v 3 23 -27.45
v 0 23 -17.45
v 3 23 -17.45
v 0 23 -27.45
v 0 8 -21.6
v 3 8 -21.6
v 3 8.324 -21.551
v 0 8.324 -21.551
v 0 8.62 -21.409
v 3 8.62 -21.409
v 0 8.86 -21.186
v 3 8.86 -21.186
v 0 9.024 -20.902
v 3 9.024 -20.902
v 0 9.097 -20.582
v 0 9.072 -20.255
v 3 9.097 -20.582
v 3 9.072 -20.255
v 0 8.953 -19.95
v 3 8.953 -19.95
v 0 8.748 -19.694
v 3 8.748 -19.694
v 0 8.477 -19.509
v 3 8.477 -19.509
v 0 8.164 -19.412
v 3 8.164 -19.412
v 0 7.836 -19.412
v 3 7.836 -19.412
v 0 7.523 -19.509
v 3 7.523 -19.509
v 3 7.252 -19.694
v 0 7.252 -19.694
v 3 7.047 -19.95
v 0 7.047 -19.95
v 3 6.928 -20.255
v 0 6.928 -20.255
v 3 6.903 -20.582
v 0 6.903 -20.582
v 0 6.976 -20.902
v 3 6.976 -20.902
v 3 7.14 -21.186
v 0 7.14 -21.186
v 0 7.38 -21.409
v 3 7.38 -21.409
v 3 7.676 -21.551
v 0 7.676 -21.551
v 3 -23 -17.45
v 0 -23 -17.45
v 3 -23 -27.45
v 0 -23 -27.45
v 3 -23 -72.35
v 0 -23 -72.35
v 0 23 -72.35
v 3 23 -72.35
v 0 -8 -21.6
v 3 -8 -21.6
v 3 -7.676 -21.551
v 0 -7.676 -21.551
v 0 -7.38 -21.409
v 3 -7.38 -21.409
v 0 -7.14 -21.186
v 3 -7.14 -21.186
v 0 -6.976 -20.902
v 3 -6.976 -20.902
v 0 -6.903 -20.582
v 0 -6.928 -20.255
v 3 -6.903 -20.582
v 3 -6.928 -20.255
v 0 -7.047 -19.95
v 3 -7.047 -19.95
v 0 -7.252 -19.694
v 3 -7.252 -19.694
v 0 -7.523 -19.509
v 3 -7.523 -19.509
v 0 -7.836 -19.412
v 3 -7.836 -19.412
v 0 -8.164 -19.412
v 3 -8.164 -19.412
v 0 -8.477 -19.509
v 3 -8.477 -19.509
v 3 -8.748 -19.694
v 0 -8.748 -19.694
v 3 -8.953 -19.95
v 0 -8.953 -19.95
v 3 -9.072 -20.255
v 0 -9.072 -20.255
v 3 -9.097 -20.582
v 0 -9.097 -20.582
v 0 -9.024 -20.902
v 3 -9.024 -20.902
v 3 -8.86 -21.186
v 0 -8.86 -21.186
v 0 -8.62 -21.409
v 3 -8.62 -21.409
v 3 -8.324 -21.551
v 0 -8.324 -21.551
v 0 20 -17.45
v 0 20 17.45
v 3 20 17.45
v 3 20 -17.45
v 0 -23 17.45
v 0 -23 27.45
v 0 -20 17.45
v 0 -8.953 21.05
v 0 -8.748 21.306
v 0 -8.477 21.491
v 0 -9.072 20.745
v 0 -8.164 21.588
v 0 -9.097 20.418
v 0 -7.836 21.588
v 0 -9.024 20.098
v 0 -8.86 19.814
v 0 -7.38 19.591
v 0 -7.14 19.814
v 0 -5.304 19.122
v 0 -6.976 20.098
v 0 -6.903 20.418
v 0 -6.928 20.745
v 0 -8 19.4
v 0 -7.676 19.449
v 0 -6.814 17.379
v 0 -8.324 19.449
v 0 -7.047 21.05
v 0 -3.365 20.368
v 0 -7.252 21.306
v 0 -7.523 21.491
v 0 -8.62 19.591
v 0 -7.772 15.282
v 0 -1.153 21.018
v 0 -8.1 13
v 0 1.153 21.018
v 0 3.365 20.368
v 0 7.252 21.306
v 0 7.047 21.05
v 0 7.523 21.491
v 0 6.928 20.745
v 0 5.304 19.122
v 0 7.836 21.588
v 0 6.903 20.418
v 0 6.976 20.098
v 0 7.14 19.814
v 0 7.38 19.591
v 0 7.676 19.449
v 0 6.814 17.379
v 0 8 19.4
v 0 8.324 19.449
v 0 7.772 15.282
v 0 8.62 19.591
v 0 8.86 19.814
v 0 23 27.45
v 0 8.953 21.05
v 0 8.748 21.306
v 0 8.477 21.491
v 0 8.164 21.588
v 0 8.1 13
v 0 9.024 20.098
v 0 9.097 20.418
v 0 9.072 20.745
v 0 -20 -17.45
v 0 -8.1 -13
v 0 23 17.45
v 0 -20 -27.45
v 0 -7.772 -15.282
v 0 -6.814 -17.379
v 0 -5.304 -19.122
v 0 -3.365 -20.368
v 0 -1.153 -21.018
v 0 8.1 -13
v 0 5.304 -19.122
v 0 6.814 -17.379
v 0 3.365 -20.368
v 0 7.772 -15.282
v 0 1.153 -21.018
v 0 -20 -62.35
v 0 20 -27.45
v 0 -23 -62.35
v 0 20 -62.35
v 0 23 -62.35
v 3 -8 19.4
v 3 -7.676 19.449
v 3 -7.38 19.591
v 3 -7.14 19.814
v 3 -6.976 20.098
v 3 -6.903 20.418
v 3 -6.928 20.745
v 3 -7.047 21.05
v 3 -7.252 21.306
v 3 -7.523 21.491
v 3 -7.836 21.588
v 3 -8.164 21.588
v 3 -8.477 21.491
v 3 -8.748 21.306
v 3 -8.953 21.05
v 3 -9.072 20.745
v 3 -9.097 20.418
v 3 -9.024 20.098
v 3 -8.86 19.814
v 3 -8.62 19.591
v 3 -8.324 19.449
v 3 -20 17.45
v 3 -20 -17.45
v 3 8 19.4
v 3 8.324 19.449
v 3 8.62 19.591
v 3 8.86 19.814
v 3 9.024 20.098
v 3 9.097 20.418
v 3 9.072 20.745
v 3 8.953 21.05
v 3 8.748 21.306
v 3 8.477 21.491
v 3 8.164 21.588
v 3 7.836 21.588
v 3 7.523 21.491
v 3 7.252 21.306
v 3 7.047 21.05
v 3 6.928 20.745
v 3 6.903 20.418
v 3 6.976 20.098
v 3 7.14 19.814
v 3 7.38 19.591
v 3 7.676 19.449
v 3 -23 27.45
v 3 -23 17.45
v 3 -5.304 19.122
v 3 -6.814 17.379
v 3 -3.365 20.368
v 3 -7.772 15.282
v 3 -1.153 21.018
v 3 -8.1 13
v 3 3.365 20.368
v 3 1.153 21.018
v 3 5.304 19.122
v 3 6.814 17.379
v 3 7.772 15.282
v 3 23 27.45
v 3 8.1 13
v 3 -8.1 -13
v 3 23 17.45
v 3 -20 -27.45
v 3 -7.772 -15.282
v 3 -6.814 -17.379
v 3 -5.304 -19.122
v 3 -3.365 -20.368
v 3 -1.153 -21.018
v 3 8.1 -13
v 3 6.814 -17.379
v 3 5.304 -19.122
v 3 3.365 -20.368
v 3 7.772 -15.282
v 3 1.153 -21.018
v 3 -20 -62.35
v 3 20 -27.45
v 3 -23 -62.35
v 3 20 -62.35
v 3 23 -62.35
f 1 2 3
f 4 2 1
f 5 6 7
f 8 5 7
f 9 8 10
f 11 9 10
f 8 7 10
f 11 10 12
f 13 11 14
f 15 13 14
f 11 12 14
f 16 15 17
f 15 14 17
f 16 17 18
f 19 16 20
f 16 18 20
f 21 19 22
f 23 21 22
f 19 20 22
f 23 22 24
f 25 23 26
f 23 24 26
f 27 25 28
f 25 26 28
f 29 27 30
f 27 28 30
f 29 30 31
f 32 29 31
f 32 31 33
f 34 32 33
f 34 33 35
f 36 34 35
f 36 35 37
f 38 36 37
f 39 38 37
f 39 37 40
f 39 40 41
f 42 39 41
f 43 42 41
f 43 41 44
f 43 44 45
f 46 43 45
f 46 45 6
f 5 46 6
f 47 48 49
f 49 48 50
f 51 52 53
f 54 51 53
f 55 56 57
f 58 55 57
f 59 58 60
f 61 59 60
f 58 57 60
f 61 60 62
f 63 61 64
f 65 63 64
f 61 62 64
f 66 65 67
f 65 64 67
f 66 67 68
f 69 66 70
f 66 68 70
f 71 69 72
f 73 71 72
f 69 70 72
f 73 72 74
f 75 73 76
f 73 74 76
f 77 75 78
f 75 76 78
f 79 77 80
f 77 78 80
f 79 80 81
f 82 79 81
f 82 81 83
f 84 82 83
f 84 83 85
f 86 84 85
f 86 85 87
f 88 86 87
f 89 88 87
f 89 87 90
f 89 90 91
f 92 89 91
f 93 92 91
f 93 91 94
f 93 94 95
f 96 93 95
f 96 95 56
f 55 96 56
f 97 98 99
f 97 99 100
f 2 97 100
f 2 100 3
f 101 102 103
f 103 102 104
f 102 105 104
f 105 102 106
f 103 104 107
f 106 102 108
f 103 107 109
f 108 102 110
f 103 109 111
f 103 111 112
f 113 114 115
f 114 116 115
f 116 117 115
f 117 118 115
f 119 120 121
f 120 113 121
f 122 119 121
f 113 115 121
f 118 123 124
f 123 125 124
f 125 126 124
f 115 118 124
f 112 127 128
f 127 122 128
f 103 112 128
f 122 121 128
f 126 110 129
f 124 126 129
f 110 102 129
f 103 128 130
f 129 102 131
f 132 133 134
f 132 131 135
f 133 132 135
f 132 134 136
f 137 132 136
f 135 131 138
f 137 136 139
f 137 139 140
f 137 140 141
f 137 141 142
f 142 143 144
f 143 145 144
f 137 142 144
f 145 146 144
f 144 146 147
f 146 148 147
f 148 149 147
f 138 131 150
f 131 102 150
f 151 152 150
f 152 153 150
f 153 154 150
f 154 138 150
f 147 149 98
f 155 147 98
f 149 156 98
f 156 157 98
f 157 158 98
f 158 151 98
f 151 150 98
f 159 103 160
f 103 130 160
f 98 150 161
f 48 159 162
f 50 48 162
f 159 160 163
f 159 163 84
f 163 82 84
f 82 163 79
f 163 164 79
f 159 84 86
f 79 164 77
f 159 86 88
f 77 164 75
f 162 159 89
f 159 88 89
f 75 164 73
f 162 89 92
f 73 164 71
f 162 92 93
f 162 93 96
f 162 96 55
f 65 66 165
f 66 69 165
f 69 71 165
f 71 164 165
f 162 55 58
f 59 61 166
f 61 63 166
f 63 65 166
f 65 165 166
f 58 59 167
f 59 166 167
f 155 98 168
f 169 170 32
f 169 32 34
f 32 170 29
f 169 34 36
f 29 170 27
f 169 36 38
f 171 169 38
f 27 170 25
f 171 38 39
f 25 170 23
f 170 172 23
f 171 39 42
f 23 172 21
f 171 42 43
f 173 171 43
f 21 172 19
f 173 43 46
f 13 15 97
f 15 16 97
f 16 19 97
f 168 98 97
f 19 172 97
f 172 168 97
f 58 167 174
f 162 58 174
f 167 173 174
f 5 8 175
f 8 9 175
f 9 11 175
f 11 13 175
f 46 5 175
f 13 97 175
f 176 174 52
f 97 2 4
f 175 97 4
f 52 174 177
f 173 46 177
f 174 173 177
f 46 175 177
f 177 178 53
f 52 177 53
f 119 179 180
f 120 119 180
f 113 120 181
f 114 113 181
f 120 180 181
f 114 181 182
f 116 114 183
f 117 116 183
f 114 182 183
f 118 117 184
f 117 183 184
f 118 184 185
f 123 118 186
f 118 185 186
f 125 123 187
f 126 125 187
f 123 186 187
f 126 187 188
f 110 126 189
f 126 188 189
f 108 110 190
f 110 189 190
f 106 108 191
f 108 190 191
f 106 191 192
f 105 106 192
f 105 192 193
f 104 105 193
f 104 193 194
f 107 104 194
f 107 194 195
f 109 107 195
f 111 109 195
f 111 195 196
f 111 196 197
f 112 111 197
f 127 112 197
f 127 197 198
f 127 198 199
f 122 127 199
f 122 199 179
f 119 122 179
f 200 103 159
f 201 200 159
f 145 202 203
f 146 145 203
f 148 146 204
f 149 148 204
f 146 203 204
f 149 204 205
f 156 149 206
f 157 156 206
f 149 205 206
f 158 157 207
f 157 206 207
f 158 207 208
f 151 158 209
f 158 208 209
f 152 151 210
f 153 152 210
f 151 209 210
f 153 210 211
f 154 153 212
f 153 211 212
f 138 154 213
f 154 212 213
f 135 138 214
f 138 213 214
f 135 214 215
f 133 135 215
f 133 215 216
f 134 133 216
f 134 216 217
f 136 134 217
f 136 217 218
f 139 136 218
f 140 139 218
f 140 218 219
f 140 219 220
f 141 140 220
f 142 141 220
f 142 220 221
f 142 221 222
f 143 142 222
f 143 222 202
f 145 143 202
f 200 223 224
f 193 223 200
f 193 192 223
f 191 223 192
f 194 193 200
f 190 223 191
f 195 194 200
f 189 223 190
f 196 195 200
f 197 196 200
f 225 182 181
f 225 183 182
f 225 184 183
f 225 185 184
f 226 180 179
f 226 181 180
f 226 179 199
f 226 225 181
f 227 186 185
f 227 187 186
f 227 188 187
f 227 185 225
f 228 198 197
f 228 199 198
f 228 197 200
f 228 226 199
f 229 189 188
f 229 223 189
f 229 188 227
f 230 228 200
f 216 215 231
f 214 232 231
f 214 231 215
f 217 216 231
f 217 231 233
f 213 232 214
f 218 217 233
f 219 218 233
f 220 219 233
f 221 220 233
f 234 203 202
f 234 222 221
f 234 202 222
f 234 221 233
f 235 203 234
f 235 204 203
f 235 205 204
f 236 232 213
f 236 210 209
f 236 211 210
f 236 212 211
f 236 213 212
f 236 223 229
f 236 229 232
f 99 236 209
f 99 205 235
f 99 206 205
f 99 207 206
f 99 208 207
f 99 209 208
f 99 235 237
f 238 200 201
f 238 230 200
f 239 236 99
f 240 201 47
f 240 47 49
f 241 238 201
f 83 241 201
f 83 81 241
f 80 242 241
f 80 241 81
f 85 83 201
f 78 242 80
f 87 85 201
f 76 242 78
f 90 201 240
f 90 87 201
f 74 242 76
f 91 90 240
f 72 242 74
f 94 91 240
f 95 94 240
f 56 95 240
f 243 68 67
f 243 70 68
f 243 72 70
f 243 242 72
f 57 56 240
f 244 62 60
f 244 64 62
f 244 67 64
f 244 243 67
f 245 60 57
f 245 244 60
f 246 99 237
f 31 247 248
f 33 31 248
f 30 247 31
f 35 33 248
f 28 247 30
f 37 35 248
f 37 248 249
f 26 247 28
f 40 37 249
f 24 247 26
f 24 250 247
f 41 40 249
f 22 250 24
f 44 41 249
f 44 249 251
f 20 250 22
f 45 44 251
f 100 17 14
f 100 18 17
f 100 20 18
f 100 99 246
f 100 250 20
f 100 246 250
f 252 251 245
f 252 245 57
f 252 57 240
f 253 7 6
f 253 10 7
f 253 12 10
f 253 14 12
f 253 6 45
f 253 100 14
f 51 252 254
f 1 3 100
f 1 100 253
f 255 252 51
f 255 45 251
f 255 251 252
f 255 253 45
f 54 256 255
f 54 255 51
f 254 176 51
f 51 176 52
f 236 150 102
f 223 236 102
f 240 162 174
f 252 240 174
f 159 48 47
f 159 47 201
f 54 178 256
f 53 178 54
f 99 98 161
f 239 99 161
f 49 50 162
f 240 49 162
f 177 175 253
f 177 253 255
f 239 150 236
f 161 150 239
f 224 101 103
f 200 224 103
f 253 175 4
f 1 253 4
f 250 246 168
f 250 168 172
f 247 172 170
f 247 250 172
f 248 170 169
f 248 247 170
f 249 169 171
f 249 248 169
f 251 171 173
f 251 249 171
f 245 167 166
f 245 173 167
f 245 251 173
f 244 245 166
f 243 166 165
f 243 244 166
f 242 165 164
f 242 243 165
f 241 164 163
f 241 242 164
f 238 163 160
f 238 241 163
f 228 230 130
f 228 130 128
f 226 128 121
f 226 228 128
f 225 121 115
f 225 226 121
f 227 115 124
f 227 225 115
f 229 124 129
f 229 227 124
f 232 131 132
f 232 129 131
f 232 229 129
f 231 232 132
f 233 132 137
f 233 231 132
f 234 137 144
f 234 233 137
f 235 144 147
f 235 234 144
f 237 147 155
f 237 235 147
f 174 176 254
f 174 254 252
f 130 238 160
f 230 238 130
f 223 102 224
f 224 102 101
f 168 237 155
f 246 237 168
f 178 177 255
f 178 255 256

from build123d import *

# Parameters (mm, degrees)
SKETCH1_W           = 99.8
SKETCH1_H           = 40
SKETCH1_W_2         = 10
SKETCH1_H_2         = 3
BOSS_EXTRUDE1_DEPTH = 3
SKETCH2_R           = 1.1
CUT_EXTRUDE1_DEPTH  = 76.977118266


with BuildPart() as part:
    # Sketch1 → Boss-Extrude1 (new body)
    with BuildSketch(Plane(origin=(0, 0, 0), x_dir=(0, 0, -1), z_dir=(1, 0, 0))):
        with Locations((22.45, 0)):
            Rectangle(SKETCH1_W, SKETCH1_H)
        with Locations((-22.45, 21.5)):
            Rectangle(SKETCH1_W_2, SKETCH1_H_2)
        with Locations((22.45, 21.5)):
            Rectangle(SKETCH1_W_2, SKETCH1_H_2)
        with Locations((67.35, 21.5)):
            Rectangle(SKETCH1_W_2, SKETCH1_H_2)
        with Locations((67.35, -21.5)):
            Rectangle(SKETCH1_W_2, SKETCH1_H_2)
        with Locations((22.45, -21.5)):
            Rectangle(SKETCH1_W_2, SKETCH1_H_2)
        with Locations((-22.45, -21.5)):
            Rectangle(SKETCH1_W_2, SKETCH1_H_2)
    extrude(amount=BOSS_EXTRUDE1_DEPTH)

    # Sketch2 → Cut-Extrude1 (cut, through all)
    with BuildSketch(Plane(origin=(3, 0, 0), x_dir=(0, 0, -1), z_dir=(1, 0, 0))):
        with Locations((-20.5, 8)):
            Circle(SKETCH2_R)
        with Locations((-20.5, -8)):
            Circle(SKETCH2_R)
        with Locations((20.5, 8)):
            Circle(SKETCH2_R)
        with Locations((20.5, -8)):
            Circle(SKETCH2_R)
        with BuildLine():
            Line((-13, 8.1), (13, 8.1))
            ThreePointArc((13, 8.1), (21.1, 0), (13, -8.1))
            Line((13, -8.1), (-13, -8.1))
            ThreePointArc((-13, -8.1), (-21.1, 0), (-13, 8.1))
        make_face()
    extrude(amount=-CUT_EXTRUDE1_DEPTH, mode=Mode.SUBTRACT)


solid = part.part
